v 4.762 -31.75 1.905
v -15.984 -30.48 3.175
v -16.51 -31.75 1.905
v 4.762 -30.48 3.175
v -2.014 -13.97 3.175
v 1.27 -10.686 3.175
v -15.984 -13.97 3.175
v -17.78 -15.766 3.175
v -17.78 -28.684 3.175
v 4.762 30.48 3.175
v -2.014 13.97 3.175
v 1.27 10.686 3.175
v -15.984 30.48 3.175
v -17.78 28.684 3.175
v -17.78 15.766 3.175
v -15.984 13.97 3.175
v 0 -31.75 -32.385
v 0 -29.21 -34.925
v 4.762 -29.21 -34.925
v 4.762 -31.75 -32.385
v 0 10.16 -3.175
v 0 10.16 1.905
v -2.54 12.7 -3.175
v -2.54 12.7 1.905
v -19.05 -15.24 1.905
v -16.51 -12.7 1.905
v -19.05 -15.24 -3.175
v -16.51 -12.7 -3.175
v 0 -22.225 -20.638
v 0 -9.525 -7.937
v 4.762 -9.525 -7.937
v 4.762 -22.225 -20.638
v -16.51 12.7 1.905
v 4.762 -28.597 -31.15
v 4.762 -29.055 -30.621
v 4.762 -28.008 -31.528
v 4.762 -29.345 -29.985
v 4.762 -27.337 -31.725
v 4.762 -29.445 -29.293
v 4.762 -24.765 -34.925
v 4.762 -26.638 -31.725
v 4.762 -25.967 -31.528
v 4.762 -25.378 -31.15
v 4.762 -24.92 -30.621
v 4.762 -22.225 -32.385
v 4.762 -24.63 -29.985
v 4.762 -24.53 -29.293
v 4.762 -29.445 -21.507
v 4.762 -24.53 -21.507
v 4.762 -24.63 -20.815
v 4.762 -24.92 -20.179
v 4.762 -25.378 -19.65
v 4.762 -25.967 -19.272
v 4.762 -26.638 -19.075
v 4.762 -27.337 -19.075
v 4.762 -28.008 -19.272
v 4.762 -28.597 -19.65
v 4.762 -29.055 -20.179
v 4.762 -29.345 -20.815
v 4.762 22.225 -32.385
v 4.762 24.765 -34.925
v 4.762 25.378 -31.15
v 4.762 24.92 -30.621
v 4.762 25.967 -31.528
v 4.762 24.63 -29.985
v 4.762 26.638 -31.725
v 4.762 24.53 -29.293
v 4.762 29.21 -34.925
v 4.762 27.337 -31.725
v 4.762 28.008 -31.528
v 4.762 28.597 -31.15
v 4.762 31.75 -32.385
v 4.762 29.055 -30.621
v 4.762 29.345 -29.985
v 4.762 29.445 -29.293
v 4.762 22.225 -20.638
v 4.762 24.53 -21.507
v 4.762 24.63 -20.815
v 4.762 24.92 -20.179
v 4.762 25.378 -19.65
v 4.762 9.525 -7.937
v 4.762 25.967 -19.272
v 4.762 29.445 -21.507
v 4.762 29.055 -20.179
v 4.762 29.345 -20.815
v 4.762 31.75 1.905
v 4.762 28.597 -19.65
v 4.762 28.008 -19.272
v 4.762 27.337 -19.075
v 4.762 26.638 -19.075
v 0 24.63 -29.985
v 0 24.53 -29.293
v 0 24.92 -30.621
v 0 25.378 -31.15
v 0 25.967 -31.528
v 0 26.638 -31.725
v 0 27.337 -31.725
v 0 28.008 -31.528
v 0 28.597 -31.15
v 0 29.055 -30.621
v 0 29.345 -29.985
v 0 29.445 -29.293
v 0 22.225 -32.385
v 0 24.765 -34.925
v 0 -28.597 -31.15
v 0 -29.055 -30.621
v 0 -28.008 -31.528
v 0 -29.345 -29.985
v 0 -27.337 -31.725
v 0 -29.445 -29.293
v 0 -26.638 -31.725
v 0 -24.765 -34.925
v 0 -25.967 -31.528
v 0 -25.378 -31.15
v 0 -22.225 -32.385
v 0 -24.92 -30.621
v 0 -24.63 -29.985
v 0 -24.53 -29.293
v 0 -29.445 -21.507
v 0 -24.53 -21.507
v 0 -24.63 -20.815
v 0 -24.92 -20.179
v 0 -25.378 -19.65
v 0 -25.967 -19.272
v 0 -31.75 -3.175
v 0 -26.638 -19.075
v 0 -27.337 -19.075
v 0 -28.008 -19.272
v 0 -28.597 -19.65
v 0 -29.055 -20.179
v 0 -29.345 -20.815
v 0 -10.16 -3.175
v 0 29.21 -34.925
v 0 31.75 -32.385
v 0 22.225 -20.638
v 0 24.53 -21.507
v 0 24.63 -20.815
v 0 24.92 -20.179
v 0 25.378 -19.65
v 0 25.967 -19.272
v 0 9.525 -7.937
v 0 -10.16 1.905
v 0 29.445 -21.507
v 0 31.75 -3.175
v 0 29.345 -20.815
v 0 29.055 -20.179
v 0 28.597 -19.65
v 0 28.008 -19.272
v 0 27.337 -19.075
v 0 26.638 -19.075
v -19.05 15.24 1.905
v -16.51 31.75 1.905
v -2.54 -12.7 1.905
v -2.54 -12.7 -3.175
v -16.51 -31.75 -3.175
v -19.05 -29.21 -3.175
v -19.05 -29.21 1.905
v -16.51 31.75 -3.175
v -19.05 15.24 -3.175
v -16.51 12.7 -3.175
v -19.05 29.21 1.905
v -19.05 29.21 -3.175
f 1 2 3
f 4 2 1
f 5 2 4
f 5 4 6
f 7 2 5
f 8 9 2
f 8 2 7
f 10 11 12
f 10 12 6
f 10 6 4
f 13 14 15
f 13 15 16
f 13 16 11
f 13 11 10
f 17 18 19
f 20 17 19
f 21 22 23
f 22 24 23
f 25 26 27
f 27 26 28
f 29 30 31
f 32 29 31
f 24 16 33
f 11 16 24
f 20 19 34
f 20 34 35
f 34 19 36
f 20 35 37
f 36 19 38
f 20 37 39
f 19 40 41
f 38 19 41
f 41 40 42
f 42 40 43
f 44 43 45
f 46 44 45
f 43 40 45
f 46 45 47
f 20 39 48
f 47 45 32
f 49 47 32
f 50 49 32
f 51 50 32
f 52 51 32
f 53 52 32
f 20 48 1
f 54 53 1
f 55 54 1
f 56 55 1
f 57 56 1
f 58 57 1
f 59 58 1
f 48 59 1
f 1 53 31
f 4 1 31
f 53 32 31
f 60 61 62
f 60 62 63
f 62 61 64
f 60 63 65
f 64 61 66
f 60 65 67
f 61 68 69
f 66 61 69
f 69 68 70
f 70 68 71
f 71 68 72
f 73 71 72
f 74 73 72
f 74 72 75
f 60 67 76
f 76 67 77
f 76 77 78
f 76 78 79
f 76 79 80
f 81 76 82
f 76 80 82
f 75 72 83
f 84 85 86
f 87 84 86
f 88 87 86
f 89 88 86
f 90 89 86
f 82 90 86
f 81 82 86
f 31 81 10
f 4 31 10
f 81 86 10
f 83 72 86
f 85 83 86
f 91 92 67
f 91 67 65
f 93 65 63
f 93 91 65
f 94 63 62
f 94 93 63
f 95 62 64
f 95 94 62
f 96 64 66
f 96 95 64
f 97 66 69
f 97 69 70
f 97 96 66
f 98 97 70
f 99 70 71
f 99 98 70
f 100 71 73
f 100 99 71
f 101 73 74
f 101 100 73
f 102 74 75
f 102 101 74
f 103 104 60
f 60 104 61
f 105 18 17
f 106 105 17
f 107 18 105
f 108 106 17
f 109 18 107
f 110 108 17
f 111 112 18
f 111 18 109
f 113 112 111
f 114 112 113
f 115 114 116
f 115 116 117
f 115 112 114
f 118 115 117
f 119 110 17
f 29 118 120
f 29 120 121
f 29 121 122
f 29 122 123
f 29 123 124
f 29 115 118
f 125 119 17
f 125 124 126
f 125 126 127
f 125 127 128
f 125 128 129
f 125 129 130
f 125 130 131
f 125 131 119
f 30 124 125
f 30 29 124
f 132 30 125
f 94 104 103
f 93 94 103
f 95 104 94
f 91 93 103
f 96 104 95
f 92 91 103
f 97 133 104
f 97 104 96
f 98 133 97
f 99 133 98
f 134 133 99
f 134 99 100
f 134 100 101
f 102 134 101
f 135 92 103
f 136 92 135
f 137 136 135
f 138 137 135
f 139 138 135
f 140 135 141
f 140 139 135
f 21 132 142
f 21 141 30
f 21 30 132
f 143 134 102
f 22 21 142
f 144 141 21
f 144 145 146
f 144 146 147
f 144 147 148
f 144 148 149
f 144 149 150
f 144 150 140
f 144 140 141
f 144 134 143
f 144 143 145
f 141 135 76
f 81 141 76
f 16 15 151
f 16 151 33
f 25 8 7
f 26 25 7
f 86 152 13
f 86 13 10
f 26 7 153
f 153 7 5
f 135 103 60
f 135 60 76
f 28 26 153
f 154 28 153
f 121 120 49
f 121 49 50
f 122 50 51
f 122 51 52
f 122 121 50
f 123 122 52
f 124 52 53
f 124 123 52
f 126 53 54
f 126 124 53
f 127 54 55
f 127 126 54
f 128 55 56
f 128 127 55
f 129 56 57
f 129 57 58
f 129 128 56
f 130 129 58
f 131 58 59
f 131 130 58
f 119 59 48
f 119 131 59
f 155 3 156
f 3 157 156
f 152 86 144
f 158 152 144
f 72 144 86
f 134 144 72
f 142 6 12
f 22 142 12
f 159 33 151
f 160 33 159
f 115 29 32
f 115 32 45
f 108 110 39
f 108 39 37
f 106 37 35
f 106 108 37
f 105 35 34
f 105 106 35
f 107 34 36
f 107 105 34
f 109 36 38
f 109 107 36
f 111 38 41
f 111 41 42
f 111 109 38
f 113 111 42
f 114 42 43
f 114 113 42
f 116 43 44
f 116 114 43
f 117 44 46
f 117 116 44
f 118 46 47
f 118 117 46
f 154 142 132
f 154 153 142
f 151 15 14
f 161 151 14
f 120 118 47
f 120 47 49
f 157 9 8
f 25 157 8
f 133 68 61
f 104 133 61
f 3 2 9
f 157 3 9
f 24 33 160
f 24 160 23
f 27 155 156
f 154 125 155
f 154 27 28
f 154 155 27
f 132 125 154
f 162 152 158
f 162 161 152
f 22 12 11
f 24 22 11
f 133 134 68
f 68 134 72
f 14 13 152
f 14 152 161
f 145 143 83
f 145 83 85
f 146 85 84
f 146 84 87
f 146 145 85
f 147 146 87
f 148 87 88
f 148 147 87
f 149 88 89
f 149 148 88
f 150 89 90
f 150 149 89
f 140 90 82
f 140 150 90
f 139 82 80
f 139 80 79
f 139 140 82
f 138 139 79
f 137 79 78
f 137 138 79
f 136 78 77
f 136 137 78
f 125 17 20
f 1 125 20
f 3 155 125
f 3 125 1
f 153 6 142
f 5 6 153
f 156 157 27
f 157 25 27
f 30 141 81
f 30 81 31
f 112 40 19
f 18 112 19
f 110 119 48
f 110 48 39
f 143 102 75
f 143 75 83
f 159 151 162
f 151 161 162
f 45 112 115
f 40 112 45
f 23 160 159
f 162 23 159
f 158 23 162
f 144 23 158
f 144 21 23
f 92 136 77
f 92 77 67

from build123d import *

# Parameters (mm, degrees)
SKETCH1_W                 = 6.35
SKETCH1_H                 = 63.5
BOSS_EXTRUDE1_DEPTH       = 19.05
BOSS_EXTRUDE2_DEPTH       = 4.7625
SKETCH4_W                 = 19.05
SKETCH4_H                 = 25.4
CUT_EXTRUDE1_DEPTH        = 6.35
CHAMFER1_SIZE             = 12.7
CHAMFER2_SIZE             = 2.54
CHAMFER3_SIZE             = 1.27
F_8_CLEARANCE_SLOT1_DEPTH = 4.7625


# Read off the part's stored shape, not the designer's step: #8 Clearance Slot1
with BuildPart() as part:
    # Sketch1 → Boss-Extrude1 (new body)
    with BuildSketch(Plane(origin=(0, 0, 0), x_dir=(0, 0, -1), z_dir=(1, 0, 0))):
        Rectangle(SKETCH1_W, SKETCH1_H)
    extrude(amount=-BOSS_EXTRUDE1_DEPTH)

    # Sketch2 → Boss-Extrude2 (add)
    with BuildSketch(Plane(origin=(0, 0, 0), x_dir=(0, 0, -1), z_dir=(1, 0, 0))):
        Polygon((-3.175, 31.75), (34.925, 31.75), (34.925, 22.225), (7.9375, 22.225), (7.9375, -22.225), (34.925, -22.225), (34.925, -31.75), (-3.175, -31.75), align=None)
    extrude(amount=BOSS_EXTRUDE2_DEPTH)

    # Sketch4 → Cut-Extrude1 (cut)
    with BuildSketch(Plane.XY.offset(3.175)):
        with Locations((-9.525, 0)):
            Rectangle(SKETCH4_W, SKETCH4_H)
    extrude(amount=-CUT_EXTRUDE1_DEPTH, mode=Mode.SUBTRACT)

    # Chamfer1
    chamfer1_edges = [part.edges().sort_by_distance(p)[0] for p in [
        (2.38125, -22.225, -7.9375),
        (2.38125, 22.225, -7.9375),
    ]]
    chamfer(chamfer1_edges, length=CHAMFER1_SIZE)

    # Chamfer2
    chamfer2_edges = [part.edges().sort_by_distance(p)[0] for p in [
        (-19.05, 31.75, 0),
        (2.38125, -31.75, -34.925),
        (2.38125, -22.225, -34.925),
        (2.38125, 22.225, -34.925),
        (2.38125, 31.75, -34.925),
        (-19.05, -12.7, 0),
        (-19.05, 12.7, 0),
        (0, 12.7, 0),
        (0, -12.7, 0),
        (-19.05, -31.75, 0),
    ]]
    chamfer(chamfer2_edges, length=CHAMFER2_SIZE)

    # Chamfer3
    chamfer3_edges = [part.edges().sort_by_distance(p)[0] for p in [
        (-9.525, 12.7, 3.175),
        (0, 0, 3.175),
        (-9.525, -12.7, 3.175),
        (-19.05, -22.225, 3.175),
        (-5.87375, -31.75, 3.175),
        (-5.87375, 31.75, 3.175),
        (-19.05, 22.225, 3.175),
        (-17.78, 30.48, 3.175),
        (-17.78, -30.48, 3.175),
        (-17.78, 13.97, 3.175),
        (-17.78, -13.97, 3.175),
        (-1.27, 11.43, 3.175),
        (-1.27, -11.43, 3.175),
    ]]
    chamfer(chamfer3_edges, length=CHAMFER3_SIZE)

    # #8 Clearance Slot1 outline → #8 Clearance Slot1 (cut)
    with BuildSketch(Plane.YZ):
        with BuildLine():
            Line((-24.53005, -29.29255), (-24.53005, -21.50745))
            ThreePointArc((-24.53005, -21.50745), (-26.9875, -19.05), (-29.44495, -21.50745))
            Line((-29.44495, -21.50745), (-29.44495, -29.29255))
            ThreePointArc((-29.44495, -29.29255), (-26.9875, -31.75), (-24.53005, -29.29255))
        make_face()
        with BuildLine():
            Line((24.53005, -21.50745), (24.53005, -29.29255))
            ThreePointArc((24.53005, -29.29255), (26.9875, -31.75), (29.44495, -29.29255))
            Line((29.44495, -29.29255), (29.44495, -21.50745))
            ThreePointArc((29.44495, -21.50745), (26.9875, -19.05), (24.53005, -21.50745))
        make_face()
    extrude(amount=F_8_CLEARANCE_SLOT1_DEPTH, mode=Mode.SUBTRACT)


solid = part.part
